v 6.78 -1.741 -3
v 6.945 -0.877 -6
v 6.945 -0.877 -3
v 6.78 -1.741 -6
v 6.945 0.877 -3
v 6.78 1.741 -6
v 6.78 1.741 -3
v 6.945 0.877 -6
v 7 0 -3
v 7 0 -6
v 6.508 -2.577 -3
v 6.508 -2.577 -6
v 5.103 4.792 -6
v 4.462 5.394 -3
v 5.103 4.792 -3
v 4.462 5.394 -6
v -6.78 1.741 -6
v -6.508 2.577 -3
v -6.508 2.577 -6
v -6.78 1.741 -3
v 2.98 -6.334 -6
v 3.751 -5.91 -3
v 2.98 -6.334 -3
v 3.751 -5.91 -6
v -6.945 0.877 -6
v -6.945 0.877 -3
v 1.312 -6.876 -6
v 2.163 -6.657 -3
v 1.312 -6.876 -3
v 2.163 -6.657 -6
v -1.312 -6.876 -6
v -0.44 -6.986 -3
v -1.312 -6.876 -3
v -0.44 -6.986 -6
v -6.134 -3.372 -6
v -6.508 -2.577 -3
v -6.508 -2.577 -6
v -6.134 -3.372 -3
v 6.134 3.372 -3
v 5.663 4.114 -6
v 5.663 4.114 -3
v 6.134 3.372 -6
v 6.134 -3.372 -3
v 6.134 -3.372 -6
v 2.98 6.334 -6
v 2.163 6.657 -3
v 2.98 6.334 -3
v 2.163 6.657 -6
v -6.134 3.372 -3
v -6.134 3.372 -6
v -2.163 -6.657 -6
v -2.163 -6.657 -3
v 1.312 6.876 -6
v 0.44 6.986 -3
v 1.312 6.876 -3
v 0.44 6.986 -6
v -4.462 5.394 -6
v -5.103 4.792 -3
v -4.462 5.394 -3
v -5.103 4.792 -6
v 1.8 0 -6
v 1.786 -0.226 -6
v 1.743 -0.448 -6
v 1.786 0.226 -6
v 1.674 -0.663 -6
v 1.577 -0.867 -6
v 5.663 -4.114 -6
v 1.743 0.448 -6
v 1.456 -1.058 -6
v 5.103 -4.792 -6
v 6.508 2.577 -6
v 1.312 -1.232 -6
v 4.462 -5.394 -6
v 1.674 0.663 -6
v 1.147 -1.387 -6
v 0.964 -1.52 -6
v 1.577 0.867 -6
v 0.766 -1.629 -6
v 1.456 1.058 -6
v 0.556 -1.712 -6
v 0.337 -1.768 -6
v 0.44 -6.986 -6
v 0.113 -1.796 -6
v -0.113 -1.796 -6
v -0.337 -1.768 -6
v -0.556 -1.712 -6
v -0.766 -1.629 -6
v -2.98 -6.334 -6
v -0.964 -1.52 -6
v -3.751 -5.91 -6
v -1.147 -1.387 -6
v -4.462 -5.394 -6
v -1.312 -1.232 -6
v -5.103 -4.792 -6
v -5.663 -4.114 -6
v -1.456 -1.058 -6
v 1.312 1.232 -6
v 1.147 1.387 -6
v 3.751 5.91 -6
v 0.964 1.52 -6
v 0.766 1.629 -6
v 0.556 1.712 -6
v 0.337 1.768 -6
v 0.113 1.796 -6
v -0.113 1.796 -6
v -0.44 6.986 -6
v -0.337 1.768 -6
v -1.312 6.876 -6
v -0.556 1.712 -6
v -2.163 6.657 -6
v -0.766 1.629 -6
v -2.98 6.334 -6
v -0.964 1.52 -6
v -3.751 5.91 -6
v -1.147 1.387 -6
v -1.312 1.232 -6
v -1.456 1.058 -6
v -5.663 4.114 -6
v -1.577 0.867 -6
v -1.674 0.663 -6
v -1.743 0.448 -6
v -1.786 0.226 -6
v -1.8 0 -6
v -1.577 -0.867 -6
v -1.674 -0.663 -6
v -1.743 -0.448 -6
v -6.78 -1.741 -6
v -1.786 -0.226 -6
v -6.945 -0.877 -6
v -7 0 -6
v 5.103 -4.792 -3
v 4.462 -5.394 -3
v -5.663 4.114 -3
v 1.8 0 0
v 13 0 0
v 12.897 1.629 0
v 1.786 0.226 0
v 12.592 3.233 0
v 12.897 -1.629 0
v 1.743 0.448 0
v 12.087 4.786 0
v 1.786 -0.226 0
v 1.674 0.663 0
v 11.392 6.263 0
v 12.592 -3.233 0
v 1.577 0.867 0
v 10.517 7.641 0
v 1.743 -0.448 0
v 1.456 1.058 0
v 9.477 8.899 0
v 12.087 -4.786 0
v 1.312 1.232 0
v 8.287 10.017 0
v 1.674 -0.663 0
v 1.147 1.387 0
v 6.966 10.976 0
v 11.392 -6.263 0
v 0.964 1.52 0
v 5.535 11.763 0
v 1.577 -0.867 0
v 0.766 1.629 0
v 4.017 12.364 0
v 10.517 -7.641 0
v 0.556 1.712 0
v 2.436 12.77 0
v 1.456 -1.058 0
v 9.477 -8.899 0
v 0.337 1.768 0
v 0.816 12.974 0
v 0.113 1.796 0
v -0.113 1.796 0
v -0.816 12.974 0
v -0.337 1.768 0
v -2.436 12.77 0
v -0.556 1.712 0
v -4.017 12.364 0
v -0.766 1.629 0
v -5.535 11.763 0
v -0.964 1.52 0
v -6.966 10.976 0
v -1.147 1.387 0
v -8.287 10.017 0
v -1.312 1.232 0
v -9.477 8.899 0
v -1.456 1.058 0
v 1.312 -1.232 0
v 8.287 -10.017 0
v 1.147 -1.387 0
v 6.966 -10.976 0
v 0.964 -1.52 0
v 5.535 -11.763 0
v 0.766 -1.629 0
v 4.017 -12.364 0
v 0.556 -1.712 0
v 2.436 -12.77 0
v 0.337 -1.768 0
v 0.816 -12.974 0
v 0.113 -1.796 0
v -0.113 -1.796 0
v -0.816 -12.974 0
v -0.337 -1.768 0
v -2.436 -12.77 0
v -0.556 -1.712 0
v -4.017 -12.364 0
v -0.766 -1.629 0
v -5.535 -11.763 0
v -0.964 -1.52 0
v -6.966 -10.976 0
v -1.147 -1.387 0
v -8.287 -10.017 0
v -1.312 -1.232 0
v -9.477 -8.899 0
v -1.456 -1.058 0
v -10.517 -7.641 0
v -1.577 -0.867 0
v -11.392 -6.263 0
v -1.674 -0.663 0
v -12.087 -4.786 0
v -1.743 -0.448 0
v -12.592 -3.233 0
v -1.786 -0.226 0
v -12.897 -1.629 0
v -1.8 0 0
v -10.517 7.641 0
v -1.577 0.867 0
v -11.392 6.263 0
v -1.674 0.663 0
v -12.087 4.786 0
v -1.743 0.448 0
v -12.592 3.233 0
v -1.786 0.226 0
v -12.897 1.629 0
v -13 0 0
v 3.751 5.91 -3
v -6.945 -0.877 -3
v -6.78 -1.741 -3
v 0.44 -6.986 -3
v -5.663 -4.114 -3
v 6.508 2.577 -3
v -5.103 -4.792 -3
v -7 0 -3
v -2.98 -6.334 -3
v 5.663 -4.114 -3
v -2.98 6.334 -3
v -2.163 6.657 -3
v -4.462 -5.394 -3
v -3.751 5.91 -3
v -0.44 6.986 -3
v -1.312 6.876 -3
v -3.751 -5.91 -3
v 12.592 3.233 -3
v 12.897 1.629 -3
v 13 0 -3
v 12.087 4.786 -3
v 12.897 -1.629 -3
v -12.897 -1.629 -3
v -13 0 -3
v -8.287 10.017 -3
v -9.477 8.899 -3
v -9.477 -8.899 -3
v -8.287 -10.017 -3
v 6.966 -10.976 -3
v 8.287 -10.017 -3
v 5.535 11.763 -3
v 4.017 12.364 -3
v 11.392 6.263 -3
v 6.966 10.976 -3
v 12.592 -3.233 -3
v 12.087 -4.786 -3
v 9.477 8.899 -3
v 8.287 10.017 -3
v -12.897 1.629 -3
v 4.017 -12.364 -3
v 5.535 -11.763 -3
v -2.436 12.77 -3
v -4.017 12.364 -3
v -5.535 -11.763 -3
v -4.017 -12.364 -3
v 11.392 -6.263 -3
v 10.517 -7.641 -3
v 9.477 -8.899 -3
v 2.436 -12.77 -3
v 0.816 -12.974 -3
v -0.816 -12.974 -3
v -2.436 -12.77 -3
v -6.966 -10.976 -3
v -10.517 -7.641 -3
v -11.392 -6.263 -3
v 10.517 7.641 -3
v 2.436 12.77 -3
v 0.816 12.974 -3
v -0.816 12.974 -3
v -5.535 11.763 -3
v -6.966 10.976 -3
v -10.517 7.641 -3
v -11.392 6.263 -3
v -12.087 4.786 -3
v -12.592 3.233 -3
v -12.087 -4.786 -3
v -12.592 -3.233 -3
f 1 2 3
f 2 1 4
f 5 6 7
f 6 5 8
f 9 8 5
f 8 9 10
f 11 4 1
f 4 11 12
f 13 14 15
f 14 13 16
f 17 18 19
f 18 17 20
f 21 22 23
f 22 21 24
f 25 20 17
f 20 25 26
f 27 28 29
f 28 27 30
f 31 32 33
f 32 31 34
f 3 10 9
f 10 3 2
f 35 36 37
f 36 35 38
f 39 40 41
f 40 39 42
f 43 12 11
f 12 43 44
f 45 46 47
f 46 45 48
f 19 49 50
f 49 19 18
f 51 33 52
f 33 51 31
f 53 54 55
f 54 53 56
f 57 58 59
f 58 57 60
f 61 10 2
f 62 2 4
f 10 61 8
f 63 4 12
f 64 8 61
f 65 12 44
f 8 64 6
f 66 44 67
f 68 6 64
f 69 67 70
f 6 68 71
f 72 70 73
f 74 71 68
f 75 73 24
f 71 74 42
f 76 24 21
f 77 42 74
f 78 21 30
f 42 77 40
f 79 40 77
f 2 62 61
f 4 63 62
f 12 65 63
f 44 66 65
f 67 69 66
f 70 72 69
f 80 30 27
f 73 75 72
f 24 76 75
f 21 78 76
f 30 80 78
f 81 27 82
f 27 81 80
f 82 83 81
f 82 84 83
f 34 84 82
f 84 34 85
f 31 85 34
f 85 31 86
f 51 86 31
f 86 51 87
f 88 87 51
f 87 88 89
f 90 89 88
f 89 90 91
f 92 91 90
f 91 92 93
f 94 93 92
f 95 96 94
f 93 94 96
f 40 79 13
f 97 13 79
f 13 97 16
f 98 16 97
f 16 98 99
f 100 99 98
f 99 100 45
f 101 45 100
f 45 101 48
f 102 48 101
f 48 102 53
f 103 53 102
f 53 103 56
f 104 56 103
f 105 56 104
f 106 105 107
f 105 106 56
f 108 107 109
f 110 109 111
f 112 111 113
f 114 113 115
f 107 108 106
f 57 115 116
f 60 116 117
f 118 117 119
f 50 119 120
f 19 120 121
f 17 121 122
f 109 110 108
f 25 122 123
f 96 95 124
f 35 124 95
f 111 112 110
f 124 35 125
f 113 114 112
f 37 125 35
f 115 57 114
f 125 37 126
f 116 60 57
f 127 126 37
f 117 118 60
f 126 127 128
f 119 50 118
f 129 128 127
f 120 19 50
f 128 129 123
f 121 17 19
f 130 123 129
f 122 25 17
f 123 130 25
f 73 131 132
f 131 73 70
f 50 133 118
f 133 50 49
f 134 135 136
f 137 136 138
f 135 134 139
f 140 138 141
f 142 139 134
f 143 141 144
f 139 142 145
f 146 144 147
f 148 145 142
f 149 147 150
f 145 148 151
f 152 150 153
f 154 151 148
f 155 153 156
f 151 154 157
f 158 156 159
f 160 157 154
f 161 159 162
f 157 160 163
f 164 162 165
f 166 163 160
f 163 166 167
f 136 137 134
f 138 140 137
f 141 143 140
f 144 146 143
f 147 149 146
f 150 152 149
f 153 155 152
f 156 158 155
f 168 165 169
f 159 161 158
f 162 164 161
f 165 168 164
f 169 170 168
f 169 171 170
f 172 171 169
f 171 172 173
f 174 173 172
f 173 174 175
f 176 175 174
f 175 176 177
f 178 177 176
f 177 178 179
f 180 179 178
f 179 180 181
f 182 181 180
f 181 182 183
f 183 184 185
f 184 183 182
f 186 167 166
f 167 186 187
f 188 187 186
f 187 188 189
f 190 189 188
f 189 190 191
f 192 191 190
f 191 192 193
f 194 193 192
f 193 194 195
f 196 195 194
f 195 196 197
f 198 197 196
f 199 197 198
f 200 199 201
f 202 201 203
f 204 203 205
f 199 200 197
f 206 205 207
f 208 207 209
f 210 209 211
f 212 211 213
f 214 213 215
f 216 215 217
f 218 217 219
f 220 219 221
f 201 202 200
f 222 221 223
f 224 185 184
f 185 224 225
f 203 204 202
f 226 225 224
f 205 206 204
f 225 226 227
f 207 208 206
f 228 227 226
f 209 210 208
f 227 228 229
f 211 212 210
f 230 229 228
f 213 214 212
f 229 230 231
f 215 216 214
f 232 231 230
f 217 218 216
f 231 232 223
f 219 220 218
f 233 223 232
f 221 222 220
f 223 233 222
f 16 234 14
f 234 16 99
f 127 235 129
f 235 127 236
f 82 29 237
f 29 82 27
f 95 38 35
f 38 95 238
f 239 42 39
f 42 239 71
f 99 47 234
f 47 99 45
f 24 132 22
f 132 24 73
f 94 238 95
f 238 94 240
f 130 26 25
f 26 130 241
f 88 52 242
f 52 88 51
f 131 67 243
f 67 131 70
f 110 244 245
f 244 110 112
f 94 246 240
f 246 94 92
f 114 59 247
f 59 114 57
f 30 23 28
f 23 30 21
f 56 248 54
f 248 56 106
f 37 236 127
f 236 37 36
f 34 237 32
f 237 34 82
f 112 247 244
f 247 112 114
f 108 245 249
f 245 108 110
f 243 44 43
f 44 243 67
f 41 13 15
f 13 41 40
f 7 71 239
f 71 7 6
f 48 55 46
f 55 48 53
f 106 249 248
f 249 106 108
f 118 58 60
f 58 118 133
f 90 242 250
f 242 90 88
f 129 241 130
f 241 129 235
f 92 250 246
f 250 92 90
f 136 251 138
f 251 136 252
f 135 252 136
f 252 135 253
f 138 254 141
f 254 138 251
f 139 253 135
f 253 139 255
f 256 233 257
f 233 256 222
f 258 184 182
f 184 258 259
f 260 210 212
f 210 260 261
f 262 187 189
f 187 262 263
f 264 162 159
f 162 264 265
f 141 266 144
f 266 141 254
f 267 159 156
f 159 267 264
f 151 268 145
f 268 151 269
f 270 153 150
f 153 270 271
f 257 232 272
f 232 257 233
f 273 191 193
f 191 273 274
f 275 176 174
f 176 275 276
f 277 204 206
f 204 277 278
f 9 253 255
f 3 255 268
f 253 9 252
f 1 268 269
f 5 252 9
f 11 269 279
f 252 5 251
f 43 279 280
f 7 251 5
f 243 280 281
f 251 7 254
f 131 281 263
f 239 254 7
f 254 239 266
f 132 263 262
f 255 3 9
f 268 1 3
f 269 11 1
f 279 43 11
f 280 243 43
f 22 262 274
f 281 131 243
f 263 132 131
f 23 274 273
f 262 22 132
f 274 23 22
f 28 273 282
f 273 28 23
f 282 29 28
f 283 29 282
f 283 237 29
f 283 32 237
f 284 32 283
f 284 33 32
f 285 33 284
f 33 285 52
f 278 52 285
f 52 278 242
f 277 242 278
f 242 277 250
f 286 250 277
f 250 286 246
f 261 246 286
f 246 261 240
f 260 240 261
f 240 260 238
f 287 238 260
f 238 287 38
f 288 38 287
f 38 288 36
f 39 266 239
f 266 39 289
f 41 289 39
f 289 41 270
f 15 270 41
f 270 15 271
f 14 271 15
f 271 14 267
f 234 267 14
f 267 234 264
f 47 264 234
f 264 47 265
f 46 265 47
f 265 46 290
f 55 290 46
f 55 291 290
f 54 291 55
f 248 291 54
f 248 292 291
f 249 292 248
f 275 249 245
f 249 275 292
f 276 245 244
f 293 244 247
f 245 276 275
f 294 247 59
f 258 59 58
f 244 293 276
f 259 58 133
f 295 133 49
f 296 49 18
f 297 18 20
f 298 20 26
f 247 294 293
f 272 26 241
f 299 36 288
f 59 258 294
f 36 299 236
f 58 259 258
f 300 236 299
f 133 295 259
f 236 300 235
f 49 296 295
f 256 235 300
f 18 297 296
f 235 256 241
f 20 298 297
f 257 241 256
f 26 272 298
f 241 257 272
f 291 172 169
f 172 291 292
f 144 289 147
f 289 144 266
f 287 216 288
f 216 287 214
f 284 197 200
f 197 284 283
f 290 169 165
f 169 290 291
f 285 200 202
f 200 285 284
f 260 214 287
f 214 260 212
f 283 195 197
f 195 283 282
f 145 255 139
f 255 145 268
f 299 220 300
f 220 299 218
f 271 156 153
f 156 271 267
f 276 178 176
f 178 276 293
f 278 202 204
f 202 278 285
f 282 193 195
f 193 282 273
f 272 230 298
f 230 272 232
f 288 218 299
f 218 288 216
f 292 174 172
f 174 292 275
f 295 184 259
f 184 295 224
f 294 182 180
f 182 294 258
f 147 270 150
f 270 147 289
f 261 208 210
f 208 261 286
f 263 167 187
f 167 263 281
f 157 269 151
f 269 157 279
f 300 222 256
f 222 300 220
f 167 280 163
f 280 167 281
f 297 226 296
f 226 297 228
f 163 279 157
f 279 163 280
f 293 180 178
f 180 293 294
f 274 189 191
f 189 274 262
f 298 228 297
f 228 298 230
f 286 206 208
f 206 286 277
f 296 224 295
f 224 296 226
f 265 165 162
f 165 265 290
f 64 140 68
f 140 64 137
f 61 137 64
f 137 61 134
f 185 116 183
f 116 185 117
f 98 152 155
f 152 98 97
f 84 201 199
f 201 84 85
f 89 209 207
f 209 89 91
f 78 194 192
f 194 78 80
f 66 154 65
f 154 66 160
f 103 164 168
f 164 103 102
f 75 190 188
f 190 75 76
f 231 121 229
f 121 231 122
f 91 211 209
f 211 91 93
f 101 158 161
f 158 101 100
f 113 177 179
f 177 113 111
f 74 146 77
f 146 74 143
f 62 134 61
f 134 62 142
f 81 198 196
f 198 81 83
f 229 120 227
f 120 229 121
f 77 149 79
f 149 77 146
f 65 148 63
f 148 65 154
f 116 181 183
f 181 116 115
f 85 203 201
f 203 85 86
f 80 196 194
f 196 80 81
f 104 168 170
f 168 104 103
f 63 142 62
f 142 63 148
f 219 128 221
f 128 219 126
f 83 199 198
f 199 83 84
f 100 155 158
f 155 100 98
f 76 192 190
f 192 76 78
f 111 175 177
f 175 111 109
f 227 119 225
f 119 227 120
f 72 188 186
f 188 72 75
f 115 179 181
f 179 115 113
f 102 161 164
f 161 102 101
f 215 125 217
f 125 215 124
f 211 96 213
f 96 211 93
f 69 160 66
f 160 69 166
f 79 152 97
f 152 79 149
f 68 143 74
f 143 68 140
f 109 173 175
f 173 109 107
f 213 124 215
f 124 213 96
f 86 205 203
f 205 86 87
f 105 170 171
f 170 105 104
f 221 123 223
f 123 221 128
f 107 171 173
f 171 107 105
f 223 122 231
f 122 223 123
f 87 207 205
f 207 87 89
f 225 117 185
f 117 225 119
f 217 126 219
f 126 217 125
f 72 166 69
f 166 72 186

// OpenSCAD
$fn = 50;


difference() {
	union() {
		translate(v = [0, 0, -6.0000000000]) {
			cylinder(h = 6, r = 7.0000000000);
		}
		translate(v = [0, 0, -3.0000000000]) {
			cylinder(h = 3, r = 13.0000000000);
		}
	}
	union() {
		#translate(v = [0, 0, -6]) {
			cylinder(h = 6, r = 1.8000000000);
		}
	}
}
